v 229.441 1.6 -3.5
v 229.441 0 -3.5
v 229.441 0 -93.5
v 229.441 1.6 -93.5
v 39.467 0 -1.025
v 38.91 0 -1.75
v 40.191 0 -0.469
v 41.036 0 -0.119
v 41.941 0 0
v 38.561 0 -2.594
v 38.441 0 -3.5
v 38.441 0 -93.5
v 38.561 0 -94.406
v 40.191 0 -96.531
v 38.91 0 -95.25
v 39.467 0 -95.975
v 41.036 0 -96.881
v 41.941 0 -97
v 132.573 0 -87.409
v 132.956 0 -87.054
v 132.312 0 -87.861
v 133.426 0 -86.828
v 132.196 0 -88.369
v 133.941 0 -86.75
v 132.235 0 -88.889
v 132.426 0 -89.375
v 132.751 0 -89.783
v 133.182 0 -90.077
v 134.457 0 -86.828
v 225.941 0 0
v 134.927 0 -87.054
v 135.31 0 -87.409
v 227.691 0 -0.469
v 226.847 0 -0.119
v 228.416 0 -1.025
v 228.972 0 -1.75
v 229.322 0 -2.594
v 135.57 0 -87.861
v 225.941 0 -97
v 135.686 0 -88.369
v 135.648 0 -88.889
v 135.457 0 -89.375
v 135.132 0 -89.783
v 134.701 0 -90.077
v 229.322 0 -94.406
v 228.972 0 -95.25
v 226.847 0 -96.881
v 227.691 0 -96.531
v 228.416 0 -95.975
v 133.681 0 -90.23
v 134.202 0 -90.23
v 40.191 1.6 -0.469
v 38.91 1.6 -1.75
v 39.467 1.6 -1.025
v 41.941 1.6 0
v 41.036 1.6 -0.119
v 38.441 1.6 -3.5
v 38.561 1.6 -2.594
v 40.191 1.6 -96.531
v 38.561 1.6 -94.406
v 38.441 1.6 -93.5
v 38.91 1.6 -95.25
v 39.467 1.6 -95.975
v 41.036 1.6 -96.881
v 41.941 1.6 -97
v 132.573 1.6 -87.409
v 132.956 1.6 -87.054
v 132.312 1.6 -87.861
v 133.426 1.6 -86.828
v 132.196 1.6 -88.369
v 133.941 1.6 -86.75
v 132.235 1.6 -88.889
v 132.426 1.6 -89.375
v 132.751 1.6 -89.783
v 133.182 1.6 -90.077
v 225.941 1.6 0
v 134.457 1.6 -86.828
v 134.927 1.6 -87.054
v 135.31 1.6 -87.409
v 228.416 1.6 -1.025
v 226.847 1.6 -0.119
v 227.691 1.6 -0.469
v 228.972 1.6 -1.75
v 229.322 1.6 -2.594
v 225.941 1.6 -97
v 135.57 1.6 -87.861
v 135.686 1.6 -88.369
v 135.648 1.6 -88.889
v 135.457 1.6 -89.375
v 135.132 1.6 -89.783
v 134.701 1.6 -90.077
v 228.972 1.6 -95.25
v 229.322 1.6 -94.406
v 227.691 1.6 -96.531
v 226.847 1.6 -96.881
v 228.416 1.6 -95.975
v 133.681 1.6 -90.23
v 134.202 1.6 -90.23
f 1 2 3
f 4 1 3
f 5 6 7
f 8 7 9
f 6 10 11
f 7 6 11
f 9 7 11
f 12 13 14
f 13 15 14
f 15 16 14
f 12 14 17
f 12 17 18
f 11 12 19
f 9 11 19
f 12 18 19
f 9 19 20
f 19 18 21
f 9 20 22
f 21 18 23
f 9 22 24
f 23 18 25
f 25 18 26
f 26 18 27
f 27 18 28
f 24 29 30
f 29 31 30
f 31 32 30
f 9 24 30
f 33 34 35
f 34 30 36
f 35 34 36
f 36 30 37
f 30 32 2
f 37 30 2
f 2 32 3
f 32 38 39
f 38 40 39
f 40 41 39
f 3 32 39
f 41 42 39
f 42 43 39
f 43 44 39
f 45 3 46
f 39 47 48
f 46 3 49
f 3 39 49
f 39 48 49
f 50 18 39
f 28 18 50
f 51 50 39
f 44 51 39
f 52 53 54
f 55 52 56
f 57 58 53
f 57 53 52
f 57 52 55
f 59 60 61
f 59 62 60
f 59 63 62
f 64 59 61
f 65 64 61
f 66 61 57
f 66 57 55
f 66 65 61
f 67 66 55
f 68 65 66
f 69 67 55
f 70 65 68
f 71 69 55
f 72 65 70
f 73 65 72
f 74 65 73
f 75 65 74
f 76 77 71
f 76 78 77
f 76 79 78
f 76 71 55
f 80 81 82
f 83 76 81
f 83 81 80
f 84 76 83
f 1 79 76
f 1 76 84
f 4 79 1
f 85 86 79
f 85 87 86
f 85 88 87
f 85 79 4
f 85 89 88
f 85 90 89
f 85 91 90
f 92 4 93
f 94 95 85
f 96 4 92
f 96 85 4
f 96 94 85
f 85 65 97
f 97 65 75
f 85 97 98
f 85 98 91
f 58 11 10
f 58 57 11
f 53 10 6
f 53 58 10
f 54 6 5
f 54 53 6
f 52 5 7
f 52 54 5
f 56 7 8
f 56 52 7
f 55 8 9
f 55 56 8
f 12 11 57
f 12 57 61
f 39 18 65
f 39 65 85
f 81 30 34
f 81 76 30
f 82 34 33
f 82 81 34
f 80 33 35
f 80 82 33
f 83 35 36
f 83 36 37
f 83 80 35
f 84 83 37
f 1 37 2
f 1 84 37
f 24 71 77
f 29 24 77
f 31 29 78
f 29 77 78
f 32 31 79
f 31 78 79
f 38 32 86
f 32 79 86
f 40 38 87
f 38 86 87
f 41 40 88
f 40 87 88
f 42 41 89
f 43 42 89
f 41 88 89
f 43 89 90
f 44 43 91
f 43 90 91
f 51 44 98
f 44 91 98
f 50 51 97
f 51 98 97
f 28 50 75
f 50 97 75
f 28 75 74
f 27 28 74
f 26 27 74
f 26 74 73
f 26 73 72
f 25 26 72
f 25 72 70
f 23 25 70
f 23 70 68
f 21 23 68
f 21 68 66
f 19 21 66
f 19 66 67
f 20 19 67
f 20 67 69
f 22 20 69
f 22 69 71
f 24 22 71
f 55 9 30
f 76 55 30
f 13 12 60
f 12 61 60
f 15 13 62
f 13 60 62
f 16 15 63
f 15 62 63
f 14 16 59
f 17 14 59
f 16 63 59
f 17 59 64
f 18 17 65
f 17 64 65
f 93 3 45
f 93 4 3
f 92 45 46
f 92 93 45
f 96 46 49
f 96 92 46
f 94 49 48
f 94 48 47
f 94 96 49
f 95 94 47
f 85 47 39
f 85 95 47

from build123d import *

# Parameters (mm, degrees)
SKETCH_1_W          = 191
SKETCH_1_H          = 97
EXTRUDE_2_DEPTH     = 1.6
FILLET_1_R          = 3.5
SKETCH_3_R          = 1.75
CUT_EXTRUDE_1_DEPTH = 250.108231932


with BuildPart() as part:
    # 草图1 → 凸台-拉伸2 (new body)
    with BuildSketch(Plane(origin=(0, 0, 0), x_dir=(1, 0, 0), z_dir=(0, 1, 0))):
        with Locations((133.941389502, 48.5)):
            Rectangle(SKETCH_1_W, SKETCH_1_H)
    extrude(amount=EXTRUDE_2_DEPTH)

    # 圆角1
    fillet_1_edges = [part.edges().sort_by_distance(p)[0] for p in [
        (38.441389502, 0.8, 0),
        (38.441389502, 0.8, -97),
        (229.441389502, 0.8, -97),
        (229.441389502, 0.8, 0),
    ]]
    fillet(fillet_1_edges, radius=FILLET_1_R)

    # 草图3 → 切除-拉伸1 (cut, through all)
    with BuildSketch(Plane(origin=(0, 1.6, 0), x_dir=(1, 0, 0), z_dir=(0, 1, 0))):
        with Locations(Location((133.941389502, 88.5, 0), (0, 0, 270))):
            Circle(SKETCH_3_R)
    extrude(amount=-CUT_EXTRUDE_1_DEPTH, mode=Mode.SUBTRACT)


solid = part.part
